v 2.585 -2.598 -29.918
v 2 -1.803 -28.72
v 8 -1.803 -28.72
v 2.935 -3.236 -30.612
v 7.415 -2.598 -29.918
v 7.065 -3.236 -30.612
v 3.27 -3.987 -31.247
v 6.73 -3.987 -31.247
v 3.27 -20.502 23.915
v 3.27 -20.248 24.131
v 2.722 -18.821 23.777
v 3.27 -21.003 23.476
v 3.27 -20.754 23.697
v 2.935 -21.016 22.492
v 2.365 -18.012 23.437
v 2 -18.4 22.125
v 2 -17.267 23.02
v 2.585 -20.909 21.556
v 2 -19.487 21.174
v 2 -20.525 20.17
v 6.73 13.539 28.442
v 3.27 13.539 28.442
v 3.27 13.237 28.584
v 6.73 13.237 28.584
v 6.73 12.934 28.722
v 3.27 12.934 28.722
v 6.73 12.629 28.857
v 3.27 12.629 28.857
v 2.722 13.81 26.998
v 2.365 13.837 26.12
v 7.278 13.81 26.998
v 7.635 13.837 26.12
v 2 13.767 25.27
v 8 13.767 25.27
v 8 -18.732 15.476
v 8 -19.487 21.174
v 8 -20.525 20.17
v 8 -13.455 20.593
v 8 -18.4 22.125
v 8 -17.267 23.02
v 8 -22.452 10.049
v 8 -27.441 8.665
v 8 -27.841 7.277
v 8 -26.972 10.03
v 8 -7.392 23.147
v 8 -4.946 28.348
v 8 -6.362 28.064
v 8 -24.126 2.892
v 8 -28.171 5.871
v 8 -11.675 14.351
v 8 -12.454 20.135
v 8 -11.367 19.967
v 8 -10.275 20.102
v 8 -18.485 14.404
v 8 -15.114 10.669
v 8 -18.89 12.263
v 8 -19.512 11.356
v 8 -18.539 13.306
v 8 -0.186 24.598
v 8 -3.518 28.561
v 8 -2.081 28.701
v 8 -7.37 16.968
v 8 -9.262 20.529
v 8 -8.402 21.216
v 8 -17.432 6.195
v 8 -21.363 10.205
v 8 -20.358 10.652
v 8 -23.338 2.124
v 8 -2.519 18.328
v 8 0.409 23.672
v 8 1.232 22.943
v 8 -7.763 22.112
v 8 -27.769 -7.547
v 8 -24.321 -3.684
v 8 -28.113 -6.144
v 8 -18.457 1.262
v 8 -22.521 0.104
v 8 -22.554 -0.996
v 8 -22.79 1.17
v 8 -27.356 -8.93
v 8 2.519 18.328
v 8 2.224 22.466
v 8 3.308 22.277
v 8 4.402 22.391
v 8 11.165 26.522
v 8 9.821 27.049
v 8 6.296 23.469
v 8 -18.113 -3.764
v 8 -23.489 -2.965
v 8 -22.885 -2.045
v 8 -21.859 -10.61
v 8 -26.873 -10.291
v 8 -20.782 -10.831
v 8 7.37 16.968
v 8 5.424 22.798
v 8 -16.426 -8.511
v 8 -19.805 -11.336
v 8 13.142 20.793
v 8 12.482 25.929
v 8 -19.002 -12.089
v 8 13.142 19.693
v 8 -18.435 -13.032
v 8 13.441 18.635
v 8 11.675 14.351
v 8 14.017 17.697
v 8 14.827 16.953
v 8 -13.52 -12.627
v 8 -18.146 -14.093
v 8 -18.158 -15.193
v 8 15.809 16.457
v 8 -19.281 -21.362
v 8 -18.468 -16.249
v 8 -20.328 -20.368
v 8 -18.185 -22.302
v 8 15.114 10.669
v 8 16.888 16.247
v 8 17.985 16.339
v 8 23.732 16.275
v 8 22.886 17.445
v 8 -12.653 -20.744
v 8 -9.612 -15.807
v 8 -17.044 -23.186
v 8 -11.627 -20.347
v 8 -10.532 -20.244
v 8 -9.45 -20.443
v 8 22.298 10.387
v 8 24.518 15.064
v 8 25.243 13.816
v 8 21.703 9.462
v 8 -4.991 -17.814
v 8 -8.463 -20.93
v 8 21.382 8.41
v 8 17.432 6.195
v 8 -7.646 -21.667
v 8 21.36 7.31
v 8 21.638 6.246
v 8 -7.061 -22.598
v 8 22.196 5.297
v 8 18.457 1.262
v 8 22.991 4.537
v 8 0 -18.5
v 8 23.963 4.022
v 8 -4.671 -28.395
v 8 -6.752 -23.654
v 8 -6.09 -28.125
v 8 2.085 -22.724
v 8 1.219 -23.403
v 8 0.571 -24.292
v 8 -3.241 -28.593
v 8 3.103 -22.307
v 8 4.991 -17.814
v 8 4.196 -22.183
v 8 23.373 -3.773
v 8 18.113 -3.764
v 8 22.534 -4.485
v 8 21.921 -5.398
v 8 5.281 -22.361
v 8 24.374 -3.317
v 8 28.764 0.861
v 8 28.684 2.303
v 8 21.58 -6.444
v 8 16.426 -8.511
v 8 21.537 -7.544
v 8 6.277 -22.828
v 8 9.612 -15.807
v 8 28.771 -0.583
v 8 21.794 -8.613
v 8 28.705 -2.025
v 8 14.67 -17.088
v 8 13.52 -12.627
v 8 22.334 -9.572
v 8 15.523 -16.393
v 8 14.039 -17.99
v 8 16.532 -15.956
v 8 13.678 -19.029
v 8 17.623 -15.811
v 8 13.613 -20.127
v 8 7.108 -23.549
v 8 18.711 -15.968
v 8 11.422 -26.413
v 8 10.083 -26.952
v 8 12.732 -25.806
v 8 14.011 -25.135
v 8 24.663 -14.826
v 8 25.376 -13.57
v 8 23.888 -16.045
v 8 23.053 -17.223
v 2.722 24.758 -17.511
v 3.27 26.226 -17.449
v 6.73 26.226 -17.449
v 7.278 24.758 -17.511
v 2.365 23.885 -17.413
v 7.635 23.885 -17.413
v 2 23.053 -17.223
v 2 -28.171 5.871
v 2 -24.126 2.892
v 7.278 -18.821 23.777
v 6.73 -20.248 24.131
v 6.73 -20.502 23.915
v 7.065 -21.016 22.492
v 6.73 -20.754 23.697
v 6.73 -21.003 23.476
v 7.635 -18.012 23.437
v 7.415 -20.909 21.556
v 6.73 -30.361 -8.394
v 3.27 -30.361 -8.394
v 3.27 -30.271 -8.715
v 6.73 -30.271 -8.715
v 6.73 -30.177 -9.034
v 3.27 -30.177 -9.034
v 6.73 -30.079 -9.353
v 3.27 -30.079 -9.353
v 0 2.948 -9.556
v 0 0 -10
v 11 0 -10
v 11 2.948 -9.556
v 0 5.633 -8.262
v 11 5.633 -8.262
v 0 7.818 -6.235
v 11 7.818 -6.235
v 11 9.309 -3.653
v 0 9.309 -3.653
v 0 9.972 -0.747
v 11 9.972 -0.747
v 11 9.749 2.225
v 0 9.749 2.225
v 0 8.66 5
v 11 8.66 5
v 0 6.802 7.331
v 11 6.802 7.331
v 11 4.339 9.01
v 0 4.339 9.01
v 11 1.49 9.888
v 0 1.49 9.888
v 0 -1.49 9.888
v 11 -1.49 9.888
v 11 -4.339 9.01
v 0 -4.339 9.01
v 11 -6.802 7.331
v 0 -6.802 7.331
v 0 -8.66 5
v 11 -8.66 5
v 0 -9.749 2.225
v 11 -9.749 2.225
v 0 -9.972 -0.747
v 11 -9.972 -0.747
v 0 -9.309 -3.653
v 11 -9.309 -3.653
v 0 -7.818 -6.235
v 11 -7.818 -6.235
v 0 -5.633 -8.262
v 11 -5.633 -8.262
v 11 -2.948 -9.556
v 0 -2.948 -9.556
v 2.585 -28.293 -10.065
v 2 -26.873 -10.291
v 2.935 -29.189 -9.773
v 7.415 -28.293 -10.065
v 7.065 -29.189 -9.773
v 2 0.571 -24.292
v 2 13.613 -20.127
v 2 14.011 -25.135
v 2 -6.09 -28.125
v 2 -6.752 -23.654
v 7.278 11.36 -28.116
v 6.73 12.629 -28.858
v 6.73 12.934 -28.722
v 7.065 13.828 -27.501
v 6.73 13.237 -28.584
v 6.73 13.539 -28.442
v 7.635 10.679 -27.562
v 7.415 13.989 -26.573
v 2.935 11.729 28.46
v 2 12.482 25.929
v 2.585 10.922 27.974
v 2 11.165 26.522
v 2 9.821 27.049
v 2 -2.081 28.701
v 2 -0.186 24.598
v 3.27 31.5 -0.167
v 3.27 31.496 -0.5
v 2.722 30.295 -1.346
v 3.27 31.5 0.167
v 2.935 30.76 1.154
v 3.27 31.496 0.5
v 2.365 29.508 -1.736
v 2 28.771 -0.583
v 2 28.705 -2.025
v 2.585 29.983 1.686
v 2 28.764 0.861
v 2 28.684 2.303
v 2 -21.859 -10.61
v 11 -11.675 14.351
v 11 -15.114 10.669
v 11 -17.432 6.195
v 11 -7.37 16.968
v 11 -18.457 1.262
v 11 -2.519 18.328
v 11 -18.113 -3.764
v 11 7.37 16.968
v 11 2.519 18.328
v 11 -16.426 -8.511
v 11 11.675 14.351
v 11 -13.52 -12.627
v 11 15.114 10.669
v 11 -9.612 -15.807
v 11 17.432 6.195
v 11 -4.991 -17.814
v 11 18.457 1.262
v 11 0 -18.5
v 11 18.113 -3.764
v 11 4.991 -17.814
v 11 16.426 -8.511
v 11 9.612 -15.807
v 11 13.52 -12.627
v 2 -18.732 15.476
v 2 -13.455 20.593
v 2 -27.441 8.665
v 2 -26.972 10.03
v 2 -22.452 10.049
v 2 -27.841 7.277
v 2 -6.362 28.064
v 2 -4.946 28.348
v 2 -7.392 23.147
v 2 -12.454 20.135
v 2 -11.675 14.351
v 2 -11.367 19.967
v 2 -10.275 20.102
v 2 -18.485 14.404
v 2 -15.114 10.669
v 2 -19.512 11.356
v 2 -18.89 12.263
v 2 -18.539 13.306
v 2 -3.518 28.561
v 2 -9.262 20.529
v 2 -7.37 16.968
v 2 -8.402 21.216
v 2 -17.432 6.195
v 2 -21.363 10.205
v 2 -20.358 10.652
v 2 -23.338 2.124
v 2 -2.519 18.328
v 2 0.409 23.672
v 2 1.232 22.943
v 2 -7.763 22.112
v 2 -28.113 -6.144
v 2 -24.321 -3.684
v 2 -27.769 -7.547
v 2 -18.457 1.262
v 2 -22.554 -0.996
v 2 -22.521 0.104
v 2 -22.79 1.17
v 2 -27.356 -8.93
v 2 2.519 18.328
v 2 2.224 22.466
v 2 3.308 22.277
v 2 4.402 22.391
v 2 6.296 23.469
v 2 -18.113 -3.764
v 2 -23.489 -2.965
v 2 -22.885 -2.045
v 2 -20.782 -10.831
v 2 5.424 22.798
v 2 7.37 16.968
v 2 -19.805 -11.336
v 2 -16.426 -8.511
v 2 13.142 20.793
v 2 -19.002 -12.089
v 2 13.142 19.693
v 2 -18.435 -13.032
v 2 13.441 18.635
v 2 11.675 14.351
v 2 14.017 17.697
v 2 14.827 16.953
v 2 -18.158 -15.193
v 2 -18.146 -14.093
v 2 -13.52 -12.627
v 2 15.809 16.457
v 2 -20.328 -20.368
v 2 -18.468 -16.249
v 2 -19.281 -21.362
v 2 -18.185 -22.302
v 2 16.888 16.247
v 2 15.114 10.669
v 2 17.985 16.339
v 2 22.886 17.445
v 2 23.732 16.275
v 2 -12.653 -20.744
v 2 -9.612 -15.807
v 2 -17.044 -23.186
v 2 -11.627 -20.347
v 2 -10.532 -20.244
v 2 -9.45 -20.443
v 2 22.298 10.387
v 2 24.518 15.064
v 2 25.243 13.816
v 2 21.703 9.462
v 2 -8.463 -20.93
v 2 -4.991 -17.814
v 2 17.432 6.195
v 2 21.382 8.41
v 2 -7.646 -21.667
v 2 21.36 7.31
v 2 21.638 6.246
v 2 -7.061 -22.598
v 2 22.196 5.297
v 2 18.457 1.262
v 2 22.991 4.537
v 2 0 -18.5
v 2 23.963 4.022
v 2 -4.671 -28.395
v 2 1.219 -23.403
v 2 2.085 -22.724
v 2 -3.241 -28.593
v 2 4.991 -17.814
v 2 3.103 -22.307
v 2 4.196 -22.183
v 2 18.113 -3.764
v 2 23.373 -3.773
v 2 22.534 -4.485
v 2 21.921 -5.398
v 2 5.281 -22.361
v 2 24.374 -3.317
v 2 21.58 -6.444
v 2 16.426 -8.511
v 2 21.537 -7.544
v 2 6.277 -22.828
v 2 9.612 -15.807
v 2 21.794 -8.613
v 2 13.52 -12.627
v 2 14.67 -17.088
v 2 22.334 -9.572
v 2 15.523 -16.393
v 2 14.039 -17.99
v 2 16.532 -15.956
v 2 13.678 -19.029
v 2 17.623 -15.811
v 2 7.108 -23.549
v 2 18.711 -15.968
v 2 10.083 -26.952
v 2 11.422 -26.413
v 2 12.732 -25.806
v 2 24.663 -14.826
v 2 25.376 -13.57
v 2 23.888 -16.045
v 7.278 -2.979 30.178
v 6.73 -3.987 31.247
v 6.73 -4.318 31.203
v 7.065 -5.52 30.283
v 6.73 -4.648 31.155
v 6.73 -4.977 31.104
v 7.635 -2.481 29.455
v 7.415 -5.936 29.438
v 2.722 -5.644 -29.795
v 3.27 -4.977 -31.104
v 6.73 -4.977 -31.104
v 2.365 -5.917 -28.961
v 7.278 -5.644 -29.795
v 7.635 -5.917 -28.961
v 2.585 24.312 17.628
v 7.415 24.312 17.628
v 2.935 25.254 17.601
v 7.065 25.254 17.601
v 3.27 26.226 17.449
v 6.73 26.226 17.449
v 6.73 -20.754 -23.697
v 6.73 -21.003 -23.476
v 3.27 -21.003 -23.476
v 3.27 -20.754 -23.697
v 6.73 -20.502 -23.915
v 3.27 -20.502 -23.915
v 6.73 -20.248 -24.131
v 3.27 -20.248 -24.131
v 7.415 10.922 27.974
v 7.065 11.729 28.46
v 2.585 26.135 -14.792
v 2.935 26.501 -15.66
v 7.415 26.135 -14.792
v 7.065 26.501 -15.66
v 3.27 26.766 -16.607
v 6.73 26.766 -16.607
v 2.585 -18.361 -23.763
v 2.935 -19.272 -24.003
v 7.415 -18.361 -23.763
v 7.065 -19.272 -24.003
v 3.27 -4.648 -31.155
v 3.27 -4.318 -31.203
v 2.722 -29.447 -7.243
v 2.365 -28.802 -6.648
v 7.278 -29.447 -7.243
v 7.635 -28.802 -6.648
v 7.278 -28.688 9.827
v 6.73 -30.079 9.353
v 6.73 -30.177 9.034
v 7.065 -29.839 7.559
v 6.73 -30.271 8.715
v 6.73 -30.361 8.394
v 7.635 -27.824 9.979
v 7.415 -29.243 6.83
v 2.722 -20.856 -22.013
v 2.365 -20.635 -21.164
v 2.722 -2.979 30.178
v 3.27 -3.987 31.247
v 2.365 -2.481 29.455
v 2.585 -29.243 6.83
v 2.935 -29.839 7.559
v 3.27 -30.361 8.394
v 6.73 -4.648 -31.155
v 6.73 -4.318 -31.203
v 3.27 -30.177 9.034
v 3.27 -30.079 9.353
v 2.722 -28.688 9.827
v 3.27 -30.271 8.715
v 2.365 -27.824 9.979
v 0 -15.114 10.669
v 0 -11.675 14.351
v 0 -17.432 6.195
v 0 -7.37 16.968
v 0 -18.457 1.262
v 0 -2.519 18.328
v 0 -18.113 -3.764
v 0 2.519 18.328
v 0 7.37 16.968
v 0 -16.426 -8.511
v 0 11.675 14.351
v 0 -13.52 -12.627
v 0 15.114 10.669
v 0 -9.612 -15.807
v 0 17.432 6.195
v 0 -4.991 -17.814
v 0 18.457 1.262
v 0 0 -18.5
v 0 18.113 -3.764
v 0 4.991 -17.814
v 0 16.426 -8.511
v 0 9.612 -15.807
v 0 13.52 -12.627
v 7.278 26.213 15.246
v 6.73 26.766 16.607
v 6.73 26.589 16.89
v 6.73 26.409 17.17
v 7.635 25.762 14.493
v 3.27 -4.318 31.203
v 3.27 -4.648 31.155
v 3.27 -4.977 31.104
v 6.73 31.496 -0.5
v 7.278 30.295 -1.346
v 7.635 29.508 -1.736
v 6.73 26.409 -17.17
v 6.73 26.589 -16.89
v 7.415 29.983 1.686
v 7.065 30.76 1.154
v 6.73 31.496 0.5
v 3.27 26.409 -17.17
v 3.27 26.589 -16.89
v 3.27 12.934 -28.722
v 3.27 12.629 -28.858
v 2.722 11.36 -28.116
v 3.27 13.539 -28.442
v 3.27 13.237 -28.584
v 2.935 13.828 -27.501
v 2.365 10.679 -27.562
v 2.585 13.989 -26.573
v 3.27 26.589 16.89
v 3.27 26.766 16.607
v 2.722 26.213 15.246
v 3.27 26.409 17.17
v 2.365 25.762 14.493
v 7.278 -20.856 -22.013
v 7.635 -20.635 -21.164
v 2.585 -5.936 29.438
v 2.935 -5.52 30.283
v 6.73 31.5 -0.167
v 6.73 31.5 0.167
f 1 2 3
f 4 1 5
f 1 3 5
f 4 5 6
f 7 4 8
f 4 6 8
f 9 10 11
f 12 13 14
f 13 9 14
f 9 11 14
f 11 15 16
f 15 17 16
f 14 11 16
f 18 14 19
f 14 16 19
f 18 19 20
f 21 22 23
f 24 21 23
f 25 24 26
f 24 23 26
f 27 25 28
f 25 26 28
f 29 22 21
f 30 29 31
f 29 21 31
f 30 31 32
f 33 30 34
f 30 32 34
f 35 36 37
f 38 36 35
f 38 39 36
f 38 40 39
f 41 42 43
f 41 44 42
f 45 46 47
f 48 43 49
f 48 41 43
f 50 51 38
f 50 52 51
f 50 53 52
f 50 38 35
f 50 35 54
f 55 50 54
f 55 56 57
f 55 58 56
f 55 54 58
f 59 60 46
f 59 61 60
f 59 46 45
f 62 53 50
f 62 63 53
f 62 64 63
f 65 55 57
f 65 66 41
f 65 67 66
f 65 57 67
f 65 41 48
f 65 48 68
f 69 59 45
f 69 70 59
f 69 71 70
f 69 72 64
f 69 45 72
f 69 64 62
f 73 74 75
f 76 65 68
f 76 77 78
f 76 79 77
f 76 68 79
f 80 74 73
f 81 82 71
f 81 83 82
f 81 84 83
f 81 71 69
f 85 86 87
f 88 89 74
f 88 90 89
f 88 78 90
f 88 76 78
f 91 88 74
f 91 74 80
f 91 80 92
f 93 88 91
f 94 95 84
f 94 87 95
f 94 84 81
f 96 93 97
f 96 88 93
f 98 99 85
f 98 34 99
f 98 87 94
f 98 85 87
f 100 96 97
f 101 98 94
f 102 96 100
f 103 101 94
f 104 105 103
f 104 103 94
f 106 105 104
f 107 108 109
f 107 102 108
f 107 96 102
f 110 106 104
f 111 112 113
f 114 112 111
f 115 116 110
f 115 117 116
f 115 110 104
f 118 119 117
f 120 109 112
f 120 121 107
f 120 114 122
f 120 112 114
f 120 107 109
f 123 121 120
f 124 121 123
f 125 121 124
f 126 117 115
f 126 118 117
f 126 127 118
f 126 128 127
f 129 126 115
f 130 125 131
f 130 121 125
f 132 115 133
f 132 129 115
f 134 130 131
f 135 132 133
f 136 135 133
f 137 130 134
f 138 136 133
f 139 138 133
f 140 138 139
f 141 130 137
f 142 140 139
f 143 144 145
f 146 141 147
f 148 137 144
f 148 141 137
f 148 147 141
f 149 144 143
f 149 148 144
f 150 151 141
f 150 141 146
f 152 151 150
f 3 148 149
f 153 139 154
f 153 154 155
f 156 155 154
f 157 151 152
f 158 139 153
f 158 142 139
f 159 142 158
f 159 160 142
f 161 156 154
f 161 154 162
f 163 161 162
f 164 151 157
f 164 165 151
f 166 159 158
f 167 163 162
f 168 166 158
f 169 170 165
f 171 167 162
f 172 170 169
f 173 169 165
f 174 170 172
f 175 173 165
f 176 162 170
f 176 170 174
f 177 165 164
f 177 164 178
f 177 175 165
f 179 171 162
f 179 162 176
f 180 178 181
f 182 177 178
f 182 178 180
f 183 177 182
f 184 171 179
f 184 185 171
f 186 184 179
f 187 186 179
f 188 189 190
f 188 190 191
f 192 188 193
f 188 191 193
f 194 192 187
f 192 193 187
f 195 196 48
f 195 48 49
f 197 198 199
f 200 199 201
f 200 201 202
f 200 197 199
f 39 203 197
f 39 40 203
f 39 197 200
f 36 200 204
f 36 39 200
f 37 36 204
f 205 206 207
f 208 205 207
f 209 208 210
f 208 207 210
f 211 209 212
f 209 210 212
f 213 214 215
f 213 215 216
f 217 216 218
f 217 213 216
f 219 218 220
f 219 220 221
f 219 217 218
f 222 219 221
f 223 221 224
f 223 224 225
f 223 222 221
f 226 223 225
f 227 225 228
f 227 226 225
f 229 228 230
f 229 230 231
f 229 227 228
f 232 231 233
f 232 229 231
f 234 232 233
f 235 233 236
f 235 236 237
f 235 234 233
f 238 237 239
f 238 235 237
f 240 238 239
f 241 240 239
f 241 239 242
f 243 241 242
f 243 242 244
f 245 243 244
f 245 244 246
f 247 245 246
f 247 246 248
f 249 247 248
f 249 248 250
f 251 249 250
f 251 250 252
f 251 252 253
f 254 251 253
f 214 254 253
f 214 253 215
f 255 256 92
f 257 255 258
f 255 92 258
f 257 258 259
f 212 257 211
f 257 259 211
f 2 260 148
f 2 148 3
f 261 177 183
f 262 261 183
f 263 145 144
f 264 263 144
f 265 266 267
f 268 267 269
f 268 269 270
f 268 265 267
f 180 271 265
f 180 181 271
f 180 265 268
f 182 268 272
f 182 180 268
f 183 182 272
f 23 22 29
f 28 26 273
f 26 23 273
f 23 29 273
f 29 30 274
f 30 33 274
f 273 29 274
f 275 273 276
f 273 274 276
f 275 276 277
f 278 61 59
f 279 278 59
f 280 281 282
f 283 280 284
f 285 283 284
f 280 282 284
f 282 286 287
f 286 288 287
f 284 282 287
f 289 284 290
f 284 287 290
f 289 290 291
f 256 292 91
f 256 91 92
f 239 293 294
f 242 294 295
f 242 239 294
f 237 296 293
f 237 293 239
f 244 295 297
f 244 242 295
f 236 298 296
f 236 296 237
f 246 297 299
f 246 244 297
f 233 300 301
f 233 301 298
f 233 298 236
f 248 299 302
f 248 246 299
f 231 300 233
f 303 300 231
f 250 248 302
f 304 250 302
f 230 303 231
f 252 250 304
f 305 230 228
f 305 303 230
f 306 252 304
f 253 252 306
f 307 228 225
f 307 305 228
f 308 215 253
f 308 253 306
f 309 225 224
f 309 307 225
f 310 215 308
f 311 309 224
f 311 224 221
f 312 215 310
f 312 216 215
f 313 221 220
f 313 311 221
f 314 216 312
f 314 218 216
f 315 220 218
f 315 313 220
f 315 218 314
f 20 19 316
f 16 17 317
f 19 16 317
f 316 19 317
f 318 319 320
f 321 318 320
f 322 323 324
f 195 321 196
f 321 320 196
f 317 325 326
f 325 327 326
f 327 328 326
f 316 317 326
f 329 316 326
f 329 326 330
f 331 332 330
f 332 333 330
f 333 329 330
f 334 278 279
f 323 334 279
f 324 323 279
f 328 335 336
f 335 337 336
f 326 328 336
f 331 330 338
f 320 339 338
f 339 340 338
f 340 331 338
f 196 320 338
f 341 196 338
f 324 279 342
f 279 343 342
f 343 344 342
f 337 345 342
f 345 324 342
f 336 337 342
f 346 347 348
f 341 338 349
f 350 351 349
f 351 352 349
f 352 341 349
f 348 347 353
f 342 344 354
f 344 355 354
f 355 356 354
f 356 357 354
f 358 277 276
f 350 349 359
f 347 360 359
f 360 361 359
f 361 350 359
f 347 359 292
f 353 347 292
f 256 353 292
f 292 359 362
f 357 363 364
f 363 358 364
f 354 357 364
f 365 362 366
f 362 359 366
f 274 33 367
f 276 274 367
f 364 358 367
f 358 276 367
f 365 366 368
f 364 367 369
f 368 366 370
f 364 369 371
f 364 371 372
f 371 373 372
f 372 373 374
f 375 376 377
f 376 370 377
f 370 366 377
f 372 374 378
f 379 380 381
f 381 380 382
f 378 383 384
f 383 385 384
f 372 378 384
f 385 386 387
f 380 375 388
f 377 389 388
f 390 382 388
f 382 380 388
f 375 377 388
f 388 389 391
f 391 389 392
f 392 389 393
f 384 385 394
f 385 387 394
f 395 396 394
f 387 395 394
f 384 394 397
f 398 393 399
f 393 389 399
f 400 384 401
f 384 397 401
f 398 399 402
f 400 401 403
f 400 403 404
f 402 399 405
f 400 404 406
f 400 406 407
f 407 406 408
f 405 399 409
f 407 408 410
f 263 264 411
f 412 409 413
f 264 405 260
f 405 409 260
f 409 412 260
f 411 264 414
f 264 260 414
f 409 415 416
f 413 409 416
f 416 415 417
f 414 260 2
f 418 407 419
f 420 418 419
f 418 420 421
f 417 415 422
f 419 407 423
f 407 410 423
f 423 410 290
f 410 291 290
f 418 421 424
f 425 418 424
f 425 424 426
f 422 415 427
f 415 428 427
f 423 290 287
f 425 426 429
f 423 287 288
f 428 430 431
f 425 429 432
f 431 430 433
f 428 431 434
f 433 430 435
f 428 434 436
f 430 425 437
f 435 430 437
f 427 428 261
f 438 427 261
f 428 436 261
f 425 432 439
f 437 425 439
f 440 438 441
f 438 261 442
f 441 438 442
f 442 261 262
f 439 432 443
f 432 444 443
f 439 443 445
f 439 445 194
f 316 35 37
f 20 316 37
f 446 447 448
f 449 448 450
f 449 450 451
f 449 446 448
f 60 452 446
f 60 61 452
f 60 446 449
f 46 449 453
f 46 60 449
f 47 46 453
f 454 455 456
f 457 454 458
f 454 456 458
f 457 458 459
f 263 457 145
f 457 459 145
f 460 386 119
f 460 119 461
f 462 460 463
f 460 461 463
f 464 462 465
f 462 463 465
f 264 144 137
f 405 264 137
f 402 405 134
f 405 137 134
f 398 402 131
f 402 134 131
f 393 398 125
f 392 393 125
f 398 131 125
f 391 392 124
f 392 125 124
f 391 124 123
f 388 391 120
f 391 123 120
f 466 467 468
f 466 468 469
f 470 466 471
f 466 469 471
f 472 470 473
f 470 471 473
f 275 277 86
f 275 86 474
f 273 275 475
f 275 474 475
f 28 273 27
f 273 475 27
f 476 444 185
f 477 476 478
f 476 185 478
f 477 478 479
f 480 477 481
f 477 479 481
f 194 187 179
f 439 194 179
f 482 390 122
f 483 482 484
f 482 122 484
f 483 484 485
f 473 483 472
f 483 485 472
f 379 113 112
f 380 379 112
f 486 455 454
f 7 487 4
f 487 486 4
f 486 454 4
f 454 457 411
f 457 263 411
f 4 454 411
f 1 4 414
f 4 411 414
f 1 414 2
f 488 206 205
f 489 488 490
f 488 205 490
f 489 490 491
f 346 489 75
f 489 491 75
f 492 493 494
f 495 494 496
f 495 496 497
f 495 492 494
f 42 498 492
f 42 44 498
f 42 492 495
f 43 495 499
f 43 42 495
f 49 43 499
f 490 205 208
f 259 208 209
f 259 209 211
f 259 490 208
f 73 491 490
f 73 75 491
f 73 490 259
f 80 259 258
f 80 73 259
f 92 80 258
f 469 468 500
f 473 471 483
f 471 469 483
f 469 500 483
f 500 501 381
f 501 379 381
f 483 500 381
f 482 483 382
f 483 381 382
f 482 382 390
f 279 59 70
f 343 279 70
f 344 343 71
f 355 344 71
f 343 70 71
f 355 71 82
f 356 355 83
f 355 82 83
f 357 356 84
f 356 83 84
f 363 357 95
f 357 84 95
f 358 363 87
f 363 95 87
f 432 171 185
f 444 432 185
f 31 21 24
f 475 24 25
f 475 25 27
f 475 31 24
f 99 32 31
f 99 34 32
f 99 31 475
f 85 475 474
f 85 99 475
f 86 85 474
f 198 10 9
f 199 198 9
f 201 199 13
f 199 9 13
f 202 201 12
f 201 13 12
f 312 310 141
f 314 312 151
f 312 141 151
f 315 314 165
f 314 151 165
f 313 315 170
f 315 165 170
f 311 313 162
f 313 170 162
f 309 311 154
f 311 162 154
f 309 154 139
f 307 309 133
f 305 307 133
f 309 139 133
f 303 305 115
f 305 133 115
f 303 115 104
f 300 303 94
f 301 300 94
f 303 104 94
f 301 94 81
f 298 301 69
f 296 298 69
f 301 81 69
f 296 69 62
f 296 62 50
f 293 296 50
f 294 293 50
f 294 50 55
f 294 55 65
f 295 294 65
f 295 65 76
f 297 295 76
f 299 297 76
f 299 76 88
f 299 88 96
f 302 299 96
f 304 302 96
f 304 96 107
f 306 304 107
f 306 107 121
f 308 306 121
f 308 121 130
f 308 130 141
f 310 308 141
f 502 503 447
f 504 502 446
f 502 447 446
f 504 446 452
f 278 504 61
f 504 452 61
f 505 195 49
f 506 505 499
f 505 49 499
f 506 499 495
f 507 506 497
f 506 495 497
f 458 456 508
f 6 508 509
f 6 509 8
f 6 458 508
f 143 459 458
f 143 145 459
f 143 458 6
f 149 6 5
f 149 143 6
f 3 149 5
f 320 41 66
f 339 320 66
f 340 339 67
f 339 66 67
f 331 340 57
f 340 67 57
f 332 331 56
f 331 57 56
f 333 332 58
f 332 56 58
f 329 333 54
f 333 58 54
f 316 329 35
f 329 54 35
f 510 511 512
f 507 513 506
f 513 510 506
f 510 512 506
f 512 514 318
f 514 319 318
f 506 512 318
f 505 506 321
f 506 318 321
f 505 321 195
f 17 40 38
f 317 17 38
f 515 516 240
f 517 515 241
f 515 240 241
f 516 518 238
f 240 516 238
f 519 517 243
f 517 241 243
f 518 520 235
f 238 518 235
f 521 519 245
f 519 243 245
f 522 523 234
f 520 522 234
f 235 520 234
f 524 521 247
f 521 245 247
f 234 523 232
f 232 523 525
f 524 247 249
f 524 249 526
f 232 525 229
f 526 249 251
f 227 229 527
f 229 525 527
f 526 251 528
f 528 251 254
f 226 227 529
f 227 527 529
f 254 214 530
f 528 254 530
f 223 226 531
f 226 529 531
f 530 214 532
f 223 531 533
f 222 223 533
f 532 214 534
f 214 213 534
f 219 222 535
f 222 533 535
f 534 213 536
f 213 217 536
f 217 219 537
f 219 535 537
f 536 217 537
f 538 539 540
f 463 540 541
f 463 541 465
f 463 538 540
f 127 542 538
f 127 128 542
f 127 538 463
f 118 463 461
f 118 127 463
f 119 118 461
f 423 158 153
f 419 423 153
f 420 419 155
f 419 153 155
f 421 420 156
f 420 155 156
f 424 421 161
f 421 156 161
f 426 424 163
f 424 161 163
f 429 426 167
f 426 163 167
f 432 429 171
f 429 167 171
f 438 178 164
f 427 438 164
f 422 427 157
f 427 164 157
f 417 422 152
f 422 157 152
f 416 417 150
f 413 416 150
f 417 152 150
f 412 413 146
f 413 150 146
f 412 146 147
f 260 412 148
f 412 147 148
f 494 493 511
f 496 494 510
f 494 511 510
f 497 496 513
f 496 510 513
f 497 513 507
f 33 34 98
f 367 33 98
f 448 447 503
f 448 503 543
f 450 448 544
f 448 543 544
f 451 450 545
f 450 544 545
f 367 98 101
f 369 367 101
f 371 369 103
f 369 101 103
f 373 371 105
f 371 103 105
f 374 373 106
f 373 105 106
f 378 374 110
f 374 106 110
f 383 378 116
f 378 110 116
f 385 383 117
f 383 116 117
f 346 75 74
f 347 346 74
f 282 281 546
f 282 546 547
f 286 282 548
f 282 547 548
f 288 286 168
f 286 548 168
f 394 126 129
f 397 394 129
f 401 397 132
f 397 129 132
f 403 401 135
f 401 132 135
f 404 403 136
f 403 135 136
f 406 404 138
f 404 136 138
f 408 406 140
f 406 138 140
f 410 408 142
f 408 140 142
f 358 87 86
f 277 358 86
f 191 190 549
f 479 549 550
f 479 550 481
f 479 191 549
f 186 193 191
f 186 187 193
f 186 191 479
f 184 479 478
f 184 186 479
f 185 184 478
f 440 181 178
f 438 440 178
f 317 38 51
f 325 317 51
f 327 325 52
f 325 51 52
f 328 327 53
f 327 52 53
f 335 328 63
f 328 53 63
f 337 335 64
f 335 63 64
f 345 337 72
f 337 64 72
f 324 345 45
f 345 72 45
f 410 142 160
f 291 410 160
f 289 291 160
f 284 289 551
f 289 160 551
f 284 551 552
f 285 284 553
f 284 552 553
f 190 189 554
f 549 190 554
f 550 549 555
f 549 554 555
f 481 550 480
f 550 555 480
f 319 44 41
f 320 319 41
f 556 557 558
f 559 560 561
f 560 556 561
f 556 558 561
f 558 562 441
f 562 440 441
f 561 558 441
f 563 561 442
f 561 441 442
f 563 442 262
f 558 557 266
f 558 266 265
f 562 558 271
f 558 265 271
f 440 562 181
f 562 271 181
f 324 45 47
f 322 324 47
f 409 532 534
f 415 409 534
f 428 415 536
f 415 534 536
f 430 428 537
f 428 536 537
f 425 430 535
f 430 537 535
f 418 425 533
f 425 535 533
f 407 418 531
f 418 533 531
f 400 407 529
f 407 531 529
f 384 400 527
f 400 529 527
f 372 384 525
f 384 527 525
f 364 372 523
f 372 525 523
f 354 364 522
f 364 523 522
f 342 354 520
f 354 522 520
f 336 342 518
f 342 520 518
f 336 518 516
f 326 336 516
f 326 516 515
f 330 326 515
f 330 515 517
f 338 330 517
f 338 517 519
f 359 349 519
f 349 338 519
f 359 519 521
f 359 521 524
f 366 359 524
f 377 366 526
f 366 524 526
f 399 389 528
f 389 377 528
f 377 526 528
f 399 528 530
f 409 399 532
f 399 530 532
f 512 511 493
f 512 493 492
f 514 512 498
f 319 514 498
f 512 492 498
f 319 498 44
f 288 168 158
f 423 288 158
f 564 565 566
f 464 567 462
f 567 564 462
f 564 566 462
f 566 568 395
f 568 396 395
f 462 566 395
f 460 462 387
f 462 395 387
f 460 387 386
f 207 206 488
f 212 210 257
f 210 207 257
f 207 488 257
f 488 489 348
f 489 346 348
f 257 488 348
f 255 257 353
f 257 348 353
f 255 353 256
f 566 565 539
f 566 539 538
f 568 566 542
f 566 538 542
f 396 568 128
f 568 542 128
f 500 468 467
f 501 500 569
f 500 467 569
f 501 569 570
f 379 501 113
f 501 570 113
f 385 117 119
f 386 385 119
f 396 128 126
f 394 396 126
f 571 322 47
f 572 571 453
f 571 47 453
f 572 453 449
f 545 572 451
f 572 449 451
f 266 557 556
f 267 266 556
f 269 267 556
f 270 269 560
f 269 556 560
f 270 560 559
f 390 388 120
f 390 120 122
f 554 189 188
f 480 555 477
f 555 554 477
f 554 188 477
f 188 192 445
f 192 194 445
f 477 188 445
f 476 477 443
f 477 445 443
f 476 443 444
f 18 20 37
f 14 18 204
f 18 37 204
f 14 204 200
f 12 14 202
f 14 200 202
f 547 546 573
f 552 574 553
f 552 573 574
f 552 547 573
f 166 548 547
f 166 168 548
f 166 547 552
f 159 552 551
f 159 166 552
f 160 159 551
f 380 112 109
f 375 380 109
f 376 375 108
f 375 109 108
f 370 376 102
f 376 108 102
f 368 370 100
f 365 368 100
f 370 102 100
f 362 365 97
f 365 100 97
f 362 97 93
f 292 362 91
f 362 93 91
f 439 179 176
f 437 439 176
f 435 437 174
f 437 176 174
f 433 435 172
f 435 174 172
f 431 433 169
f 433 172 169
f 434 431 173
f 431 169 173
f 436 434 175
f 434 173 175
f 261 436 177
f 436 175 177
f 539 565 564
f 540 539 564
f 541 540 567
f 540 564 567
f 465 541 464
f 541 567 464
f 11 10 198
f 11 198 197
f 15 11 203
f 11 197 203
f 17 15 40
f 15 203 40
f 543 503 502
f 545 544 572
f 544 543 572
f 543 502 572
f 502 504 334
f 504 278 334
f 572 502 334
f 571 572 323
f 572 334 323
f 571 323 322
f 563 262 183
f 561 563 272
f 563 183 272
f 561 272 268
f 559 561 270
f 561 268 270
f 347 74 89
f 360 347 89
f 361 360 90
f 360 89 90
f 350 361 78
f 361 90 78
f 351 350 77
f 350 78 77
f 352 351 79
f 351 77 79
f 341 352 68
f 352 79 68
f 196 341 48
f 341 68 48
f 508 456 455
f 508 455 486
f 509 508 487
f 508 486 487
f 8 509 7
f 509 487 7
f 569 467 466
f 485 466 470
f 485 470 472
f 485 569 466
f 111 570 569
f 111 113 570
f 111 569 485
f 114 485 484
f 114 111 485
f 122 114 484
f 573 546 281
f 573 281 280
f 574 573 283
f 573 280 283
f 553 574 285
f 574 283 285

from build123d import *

# Parameters (mm, degrees)
SKETCH1_R           = 18.5
SKETCH1_R_2         = 10
BOSS_EXTRUDE1_DEPTH = 11
BOSS_EXTRUDE2_START = -6
SKETCH2_R           = 31.5
SKETCH2_R_2         = 10
BOSS_EXTRUDE2_DEPTH = 6
CHAMFER1_SIZE       = 1.27
CHAMFER1_SIZE2      = 2.723523789
CUT_EXTRUDE1_DEPTH  = 46.885727629
CIRPATTERN1_COUNT   = 11


with BuildPart() as part:
    # Sketch1 → Boss-Extrude1 (new body)
    with BuildSketch(Plane(origin=(0, 0, 0), x_dir=(0, 0, -1), z_dir=(1, 0, 0))):
        Circle(SKETCH1_R)
        Circle(SKETCH1_R_2, mode=Mode.SUBTRACT)
    extrude(amount=BOSS_EXTRUDE1_DEPTH)

    # Sketch2 → Boss-Extrude2 (add)
    with BuildSketch(Plane(origin=(7.999999904, 0, 0), x_dir=(0, 0, -1), z_dir=(1, 0, 0)).offset(BOSS_EXTRUDE2_START)):
        Circle(SKETCH2_R)
        Circle(SKETCH2_R_2, mode=Mode.SUBTRACT)
    extrude(amount=BOSS_EXTRUDE2_DEPTH)

    # Chamfer1
    chamfer1_edges = [part.edges().sort_by_distance(p)[0] for p in [
        (1.999999904, 0, 31.5),
        (7.999999904, 0, 31.5),
    ]]
    chamfer1_side = [part.faces().sort_by_distance(p)[0] for p in [
        (4.999999904, 0, 31.5),
    ]]
    chamfer(chamfer1_edges, length=CHAMFER1_SIZE, length2=CHAMFER1_SIZE2, reference=chamfer1_side[0])

    # Sketch3 → Cut-Extrude1 (cut, through all)
    with BuildSketch(Plane(origin=(11, 0, 0), x_dir=(0, 0, -1), z_dir=(1, 0, 0))):
        with BuildLine():
            Line((2.025004531, 28.705137864), (3.316836887, 24.373931538))
            ThreePointArc((3.316836887, 24.373931538), (5.909643301, 21.714368856), (9.571916138, 22.33378505))
            Line((9.571916138, 22.33378505), (13.570357606, 25.375795112))
            ThreePointArc((13.570357606, 25.375795112), (15.011752501, 26.239592723), (16.607426831, 26.766459872))
            ThreePointArc((16.607426831, 26.766459872), (16.819336008, 26.633811898), (17.03018575, 26.499486284))
            Line((17.03018575, 26.499486284), (18.753086107, 29.492558003))
            Line((18.753086107, 29.492558003), (0, 32.610896361))
            Line((0, 32.610896361), (0, 31.5))
            ThreePointArc((0, 31.5), (0.250007874, 31.499007858), (0.5, 31.496031496))
            ThreePointArc((0.5, 31.496031496), (1.409727709, 30.18103184), (2.025004531, 28.705137864))
        make_face()
    cut_extrude1 = extrude(amount=-CUT_EXTRUDE1_DEPTH, mode=Mode.SUBTRACT)

    # CirPattern1: Cut-Extrude1 ×11 about axis
    cirpattern1_axis = Axis((11, 0, 0), (-1, 0, 0))
    for i in range(1, CIRPATTERN1_COUNT):
        add(cut_extrude1.rotate(cirpattern1_axis, i * 360 / CIRPATTERN1_COUNT), mode=Mode.SUBTRACT)


solid = part.part
